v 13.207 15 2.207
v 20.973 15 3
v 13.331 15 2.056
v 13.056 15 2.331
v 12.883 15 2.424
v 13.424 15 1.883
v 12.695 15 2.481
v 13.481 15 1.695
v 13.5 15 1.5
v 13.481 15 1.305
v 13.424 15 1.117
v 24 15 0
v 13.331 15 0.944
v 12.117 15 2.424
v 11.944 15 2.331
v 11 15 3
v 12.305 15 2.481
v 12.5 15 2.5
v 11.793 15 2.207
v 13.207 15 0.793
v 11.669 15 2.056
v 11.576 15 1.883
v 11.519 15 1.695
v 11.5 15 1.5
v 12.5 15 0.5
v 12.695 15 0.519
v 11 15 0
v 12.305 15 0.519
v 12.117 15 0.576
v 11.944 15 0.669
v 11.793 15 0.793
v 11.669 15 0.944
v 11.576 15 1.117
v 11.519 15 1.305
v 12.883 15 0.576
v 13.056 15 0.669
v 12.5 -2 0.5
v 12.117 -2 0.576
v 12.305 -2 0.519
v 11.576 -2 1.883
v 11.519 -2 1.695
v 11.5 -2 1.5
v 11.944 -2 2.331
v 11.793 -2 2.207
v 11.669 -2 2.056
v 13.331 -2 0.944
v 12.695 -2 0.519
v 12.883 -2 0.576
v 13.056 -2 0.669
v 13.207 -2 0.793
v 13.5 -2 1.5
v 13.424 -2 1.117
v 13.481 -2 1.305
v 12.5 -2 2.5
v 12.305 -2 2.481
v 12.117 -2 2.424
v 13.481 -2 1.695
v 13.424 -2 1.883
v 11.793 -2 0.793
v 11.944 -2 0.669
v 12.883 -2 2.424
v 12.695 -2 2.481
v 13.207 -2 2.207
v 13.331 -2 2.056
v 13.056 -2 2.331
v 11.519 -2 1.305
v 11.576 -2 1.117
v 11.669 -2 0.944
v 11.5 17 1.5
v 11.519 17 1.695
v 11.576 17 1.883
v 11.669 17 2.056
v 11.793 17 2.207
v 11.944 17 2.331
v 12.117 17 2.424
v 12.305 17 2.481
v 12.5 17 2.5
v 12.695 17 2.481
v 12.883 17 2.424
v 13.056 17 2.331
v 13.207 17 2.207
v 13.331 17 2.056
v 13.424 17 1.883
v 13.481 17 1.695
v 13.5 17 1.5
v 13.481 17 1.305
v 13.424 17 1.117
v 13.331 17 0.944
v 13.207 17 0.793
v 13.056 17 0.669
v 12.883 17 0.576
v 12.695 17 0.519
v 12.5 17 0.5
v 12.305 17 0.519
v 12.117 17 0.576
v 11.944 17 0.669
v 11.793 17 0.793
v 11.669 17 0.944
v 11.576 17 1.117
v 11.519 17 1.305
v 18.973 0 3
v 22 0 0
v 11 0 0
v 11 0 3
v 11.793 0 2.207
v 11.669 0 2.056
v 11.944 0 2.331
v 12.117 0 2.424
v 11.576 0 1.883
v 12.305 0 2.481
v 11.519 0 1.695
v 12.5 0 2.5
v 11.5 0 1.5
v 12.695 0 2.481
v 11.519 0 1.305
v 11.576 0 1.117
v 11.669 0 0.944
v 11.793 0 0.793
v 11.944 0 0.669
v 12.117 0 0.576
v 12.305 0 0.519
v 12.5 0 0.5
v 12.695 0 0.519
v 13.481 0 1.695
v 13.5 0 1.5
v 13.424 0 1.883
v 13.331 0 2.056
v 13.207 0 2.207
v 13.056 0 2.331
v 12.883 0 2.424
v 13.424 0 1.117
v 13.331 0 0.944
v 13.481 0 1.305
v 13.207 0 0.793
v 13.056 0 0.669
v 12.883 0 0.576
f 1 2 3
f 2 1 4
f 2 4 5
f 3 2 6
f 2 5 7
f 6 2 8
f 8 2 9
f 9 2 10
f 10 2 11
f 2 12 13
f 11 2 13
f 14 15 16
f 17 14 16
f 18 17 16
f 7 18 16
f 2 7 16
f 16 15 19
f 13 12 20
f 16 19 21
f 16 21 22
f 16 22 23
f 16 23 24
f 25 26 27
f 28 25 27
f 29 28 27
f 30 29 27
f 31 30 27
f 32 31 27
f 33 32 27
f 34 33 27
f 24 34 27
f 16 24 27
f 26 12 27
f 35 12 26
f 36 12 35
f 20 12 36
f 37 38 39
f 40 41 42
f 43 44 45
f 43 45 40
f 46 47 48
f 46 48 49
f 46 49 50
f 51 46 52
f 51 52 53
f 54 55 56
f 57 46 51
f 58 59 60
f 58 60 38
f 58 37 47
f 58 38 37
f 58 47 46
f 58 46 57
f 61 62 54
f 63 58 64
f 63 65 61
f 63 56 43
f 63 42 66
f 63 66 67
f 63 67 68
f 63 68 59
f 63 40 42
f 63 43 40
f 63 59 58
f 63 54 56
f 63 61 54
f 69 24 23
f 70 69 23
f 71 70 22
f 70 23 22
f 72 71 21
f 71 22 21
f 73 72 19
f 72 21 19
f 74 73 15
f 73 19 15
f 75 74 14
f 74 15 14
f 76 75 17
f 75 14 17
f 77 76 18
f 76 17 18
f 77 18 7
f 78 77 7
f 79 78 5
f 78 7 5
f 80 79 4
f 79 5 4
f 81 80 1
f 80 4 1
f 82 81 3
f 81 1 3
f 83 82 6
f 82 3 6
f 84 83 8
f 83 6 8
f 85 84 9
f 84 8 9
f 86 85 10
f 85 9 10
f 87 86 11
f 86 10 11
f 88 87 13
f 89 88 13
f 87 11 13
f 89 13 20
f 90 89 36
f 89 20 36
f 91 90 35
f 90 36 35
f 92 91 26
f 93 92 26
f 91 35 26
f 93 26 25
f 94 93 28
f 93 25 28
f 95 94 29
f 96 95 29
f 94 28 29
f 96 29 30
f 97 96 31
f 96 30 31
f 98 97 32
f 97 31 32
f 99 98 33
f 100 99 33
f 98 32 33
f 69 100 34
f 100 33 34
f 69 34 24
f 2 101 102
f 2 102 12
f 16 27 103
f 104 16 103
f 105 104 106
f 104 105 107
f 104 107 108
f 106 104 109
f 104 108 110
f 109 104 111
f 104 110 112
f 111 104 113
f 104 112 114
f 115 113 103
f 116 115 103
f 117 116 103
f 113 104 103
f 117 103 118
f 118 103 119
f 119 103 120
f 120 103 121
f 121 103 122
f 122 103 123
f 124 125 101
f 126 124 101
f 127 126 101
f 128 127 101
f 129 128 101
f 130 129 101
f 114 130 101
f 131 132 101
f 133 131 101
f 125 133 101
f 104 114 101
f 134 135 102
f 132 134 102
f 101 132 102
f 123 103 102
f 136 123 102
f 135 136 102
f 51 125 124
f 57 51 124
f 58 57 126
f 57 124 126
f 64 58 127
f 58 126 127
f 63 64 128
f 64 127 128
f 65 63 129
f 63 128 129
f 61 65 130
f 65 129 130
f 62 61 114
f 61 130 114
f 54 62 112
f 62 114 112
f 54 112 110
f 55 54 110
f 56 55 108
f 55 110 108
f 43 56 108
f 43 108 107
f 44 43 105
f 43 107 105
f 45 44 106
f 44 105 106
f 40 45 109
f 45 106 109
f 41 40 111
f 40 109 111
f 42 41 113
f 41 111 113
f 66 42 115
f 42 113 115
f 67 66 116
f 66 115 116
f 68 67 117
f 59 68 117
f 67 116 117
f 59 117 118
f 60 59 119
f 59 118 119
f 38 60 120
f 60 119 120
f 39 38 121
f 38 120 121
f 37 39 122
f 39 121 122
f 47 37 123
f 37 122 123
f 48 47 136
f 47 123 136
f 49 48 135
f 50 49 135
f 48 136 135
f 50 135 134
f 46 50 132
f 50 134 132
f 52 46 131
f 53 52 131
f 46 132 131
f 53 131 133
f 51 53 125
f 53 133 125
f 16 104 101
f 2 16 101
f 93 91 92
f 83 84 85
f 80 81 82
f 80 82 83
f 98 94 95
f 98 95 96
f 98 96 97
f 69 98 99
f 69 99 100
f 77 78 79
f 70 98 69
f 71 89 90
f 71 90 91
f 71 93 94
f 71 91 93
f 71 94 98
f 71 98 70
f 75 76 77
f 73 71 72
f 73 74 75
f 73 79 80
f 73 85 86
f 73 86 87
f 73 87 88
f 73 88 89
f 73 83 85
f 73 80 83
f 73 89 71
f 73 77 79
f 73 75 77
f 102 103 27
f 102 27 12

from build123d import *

# Parameters (mm, degrees)
F1_DEPTH = 3
F2_SIZE2 = 2.99999
F2_SIZE  = 2.99999
F3_R     = 1
F4_DEPTH = 2
F5_R     = 1
F6_DEPTH = 2


# Not quite as in the source:
# - a fillet or chamfer is up to 0.001 mm smaller than in the source, because OpenCascade refuses the exact size


with BuildPart() as f1:
    # F0 (on Top) → F1 (new body)
    with BuildSketch(Plane.XY):
        Polygon((11, 3), (11, 0), (22, 0), (24, 15), (11, 15), (11, 12), align=None)
    extrude(amount=F1_DEPTH)

    # F2 (size 3 and 3 in the source; OpenCascade refuses exactly that, so slightly less here)
    f2_edges = [f1.edges().sort_by_distance(p)[0] for p in [
        (23, 7.5, 3),
    ]]
    chamfer(f2_edges, length=F2_SIZE, length2=F2_SIZE2)

    # F3 (on face) → F4 (join)
    with BuildSketch(Plane.XZ):
        with Locations((12.5, 1.5)):
            Circle(F3_R)
    extrude(amount=F4_DEPTH)

    # F5 (on face) → F6 (join)
    with BuildSketch(Plane(origin=(0, 15, 0), x_dir=(-1, 0, 0), z_dir=(0, 1, 0))):
        with Locations((-12.5, 1.5)):
            Circle(F5_R)
    extrude(amount=F6_DEPTH)


solid = f1.part
